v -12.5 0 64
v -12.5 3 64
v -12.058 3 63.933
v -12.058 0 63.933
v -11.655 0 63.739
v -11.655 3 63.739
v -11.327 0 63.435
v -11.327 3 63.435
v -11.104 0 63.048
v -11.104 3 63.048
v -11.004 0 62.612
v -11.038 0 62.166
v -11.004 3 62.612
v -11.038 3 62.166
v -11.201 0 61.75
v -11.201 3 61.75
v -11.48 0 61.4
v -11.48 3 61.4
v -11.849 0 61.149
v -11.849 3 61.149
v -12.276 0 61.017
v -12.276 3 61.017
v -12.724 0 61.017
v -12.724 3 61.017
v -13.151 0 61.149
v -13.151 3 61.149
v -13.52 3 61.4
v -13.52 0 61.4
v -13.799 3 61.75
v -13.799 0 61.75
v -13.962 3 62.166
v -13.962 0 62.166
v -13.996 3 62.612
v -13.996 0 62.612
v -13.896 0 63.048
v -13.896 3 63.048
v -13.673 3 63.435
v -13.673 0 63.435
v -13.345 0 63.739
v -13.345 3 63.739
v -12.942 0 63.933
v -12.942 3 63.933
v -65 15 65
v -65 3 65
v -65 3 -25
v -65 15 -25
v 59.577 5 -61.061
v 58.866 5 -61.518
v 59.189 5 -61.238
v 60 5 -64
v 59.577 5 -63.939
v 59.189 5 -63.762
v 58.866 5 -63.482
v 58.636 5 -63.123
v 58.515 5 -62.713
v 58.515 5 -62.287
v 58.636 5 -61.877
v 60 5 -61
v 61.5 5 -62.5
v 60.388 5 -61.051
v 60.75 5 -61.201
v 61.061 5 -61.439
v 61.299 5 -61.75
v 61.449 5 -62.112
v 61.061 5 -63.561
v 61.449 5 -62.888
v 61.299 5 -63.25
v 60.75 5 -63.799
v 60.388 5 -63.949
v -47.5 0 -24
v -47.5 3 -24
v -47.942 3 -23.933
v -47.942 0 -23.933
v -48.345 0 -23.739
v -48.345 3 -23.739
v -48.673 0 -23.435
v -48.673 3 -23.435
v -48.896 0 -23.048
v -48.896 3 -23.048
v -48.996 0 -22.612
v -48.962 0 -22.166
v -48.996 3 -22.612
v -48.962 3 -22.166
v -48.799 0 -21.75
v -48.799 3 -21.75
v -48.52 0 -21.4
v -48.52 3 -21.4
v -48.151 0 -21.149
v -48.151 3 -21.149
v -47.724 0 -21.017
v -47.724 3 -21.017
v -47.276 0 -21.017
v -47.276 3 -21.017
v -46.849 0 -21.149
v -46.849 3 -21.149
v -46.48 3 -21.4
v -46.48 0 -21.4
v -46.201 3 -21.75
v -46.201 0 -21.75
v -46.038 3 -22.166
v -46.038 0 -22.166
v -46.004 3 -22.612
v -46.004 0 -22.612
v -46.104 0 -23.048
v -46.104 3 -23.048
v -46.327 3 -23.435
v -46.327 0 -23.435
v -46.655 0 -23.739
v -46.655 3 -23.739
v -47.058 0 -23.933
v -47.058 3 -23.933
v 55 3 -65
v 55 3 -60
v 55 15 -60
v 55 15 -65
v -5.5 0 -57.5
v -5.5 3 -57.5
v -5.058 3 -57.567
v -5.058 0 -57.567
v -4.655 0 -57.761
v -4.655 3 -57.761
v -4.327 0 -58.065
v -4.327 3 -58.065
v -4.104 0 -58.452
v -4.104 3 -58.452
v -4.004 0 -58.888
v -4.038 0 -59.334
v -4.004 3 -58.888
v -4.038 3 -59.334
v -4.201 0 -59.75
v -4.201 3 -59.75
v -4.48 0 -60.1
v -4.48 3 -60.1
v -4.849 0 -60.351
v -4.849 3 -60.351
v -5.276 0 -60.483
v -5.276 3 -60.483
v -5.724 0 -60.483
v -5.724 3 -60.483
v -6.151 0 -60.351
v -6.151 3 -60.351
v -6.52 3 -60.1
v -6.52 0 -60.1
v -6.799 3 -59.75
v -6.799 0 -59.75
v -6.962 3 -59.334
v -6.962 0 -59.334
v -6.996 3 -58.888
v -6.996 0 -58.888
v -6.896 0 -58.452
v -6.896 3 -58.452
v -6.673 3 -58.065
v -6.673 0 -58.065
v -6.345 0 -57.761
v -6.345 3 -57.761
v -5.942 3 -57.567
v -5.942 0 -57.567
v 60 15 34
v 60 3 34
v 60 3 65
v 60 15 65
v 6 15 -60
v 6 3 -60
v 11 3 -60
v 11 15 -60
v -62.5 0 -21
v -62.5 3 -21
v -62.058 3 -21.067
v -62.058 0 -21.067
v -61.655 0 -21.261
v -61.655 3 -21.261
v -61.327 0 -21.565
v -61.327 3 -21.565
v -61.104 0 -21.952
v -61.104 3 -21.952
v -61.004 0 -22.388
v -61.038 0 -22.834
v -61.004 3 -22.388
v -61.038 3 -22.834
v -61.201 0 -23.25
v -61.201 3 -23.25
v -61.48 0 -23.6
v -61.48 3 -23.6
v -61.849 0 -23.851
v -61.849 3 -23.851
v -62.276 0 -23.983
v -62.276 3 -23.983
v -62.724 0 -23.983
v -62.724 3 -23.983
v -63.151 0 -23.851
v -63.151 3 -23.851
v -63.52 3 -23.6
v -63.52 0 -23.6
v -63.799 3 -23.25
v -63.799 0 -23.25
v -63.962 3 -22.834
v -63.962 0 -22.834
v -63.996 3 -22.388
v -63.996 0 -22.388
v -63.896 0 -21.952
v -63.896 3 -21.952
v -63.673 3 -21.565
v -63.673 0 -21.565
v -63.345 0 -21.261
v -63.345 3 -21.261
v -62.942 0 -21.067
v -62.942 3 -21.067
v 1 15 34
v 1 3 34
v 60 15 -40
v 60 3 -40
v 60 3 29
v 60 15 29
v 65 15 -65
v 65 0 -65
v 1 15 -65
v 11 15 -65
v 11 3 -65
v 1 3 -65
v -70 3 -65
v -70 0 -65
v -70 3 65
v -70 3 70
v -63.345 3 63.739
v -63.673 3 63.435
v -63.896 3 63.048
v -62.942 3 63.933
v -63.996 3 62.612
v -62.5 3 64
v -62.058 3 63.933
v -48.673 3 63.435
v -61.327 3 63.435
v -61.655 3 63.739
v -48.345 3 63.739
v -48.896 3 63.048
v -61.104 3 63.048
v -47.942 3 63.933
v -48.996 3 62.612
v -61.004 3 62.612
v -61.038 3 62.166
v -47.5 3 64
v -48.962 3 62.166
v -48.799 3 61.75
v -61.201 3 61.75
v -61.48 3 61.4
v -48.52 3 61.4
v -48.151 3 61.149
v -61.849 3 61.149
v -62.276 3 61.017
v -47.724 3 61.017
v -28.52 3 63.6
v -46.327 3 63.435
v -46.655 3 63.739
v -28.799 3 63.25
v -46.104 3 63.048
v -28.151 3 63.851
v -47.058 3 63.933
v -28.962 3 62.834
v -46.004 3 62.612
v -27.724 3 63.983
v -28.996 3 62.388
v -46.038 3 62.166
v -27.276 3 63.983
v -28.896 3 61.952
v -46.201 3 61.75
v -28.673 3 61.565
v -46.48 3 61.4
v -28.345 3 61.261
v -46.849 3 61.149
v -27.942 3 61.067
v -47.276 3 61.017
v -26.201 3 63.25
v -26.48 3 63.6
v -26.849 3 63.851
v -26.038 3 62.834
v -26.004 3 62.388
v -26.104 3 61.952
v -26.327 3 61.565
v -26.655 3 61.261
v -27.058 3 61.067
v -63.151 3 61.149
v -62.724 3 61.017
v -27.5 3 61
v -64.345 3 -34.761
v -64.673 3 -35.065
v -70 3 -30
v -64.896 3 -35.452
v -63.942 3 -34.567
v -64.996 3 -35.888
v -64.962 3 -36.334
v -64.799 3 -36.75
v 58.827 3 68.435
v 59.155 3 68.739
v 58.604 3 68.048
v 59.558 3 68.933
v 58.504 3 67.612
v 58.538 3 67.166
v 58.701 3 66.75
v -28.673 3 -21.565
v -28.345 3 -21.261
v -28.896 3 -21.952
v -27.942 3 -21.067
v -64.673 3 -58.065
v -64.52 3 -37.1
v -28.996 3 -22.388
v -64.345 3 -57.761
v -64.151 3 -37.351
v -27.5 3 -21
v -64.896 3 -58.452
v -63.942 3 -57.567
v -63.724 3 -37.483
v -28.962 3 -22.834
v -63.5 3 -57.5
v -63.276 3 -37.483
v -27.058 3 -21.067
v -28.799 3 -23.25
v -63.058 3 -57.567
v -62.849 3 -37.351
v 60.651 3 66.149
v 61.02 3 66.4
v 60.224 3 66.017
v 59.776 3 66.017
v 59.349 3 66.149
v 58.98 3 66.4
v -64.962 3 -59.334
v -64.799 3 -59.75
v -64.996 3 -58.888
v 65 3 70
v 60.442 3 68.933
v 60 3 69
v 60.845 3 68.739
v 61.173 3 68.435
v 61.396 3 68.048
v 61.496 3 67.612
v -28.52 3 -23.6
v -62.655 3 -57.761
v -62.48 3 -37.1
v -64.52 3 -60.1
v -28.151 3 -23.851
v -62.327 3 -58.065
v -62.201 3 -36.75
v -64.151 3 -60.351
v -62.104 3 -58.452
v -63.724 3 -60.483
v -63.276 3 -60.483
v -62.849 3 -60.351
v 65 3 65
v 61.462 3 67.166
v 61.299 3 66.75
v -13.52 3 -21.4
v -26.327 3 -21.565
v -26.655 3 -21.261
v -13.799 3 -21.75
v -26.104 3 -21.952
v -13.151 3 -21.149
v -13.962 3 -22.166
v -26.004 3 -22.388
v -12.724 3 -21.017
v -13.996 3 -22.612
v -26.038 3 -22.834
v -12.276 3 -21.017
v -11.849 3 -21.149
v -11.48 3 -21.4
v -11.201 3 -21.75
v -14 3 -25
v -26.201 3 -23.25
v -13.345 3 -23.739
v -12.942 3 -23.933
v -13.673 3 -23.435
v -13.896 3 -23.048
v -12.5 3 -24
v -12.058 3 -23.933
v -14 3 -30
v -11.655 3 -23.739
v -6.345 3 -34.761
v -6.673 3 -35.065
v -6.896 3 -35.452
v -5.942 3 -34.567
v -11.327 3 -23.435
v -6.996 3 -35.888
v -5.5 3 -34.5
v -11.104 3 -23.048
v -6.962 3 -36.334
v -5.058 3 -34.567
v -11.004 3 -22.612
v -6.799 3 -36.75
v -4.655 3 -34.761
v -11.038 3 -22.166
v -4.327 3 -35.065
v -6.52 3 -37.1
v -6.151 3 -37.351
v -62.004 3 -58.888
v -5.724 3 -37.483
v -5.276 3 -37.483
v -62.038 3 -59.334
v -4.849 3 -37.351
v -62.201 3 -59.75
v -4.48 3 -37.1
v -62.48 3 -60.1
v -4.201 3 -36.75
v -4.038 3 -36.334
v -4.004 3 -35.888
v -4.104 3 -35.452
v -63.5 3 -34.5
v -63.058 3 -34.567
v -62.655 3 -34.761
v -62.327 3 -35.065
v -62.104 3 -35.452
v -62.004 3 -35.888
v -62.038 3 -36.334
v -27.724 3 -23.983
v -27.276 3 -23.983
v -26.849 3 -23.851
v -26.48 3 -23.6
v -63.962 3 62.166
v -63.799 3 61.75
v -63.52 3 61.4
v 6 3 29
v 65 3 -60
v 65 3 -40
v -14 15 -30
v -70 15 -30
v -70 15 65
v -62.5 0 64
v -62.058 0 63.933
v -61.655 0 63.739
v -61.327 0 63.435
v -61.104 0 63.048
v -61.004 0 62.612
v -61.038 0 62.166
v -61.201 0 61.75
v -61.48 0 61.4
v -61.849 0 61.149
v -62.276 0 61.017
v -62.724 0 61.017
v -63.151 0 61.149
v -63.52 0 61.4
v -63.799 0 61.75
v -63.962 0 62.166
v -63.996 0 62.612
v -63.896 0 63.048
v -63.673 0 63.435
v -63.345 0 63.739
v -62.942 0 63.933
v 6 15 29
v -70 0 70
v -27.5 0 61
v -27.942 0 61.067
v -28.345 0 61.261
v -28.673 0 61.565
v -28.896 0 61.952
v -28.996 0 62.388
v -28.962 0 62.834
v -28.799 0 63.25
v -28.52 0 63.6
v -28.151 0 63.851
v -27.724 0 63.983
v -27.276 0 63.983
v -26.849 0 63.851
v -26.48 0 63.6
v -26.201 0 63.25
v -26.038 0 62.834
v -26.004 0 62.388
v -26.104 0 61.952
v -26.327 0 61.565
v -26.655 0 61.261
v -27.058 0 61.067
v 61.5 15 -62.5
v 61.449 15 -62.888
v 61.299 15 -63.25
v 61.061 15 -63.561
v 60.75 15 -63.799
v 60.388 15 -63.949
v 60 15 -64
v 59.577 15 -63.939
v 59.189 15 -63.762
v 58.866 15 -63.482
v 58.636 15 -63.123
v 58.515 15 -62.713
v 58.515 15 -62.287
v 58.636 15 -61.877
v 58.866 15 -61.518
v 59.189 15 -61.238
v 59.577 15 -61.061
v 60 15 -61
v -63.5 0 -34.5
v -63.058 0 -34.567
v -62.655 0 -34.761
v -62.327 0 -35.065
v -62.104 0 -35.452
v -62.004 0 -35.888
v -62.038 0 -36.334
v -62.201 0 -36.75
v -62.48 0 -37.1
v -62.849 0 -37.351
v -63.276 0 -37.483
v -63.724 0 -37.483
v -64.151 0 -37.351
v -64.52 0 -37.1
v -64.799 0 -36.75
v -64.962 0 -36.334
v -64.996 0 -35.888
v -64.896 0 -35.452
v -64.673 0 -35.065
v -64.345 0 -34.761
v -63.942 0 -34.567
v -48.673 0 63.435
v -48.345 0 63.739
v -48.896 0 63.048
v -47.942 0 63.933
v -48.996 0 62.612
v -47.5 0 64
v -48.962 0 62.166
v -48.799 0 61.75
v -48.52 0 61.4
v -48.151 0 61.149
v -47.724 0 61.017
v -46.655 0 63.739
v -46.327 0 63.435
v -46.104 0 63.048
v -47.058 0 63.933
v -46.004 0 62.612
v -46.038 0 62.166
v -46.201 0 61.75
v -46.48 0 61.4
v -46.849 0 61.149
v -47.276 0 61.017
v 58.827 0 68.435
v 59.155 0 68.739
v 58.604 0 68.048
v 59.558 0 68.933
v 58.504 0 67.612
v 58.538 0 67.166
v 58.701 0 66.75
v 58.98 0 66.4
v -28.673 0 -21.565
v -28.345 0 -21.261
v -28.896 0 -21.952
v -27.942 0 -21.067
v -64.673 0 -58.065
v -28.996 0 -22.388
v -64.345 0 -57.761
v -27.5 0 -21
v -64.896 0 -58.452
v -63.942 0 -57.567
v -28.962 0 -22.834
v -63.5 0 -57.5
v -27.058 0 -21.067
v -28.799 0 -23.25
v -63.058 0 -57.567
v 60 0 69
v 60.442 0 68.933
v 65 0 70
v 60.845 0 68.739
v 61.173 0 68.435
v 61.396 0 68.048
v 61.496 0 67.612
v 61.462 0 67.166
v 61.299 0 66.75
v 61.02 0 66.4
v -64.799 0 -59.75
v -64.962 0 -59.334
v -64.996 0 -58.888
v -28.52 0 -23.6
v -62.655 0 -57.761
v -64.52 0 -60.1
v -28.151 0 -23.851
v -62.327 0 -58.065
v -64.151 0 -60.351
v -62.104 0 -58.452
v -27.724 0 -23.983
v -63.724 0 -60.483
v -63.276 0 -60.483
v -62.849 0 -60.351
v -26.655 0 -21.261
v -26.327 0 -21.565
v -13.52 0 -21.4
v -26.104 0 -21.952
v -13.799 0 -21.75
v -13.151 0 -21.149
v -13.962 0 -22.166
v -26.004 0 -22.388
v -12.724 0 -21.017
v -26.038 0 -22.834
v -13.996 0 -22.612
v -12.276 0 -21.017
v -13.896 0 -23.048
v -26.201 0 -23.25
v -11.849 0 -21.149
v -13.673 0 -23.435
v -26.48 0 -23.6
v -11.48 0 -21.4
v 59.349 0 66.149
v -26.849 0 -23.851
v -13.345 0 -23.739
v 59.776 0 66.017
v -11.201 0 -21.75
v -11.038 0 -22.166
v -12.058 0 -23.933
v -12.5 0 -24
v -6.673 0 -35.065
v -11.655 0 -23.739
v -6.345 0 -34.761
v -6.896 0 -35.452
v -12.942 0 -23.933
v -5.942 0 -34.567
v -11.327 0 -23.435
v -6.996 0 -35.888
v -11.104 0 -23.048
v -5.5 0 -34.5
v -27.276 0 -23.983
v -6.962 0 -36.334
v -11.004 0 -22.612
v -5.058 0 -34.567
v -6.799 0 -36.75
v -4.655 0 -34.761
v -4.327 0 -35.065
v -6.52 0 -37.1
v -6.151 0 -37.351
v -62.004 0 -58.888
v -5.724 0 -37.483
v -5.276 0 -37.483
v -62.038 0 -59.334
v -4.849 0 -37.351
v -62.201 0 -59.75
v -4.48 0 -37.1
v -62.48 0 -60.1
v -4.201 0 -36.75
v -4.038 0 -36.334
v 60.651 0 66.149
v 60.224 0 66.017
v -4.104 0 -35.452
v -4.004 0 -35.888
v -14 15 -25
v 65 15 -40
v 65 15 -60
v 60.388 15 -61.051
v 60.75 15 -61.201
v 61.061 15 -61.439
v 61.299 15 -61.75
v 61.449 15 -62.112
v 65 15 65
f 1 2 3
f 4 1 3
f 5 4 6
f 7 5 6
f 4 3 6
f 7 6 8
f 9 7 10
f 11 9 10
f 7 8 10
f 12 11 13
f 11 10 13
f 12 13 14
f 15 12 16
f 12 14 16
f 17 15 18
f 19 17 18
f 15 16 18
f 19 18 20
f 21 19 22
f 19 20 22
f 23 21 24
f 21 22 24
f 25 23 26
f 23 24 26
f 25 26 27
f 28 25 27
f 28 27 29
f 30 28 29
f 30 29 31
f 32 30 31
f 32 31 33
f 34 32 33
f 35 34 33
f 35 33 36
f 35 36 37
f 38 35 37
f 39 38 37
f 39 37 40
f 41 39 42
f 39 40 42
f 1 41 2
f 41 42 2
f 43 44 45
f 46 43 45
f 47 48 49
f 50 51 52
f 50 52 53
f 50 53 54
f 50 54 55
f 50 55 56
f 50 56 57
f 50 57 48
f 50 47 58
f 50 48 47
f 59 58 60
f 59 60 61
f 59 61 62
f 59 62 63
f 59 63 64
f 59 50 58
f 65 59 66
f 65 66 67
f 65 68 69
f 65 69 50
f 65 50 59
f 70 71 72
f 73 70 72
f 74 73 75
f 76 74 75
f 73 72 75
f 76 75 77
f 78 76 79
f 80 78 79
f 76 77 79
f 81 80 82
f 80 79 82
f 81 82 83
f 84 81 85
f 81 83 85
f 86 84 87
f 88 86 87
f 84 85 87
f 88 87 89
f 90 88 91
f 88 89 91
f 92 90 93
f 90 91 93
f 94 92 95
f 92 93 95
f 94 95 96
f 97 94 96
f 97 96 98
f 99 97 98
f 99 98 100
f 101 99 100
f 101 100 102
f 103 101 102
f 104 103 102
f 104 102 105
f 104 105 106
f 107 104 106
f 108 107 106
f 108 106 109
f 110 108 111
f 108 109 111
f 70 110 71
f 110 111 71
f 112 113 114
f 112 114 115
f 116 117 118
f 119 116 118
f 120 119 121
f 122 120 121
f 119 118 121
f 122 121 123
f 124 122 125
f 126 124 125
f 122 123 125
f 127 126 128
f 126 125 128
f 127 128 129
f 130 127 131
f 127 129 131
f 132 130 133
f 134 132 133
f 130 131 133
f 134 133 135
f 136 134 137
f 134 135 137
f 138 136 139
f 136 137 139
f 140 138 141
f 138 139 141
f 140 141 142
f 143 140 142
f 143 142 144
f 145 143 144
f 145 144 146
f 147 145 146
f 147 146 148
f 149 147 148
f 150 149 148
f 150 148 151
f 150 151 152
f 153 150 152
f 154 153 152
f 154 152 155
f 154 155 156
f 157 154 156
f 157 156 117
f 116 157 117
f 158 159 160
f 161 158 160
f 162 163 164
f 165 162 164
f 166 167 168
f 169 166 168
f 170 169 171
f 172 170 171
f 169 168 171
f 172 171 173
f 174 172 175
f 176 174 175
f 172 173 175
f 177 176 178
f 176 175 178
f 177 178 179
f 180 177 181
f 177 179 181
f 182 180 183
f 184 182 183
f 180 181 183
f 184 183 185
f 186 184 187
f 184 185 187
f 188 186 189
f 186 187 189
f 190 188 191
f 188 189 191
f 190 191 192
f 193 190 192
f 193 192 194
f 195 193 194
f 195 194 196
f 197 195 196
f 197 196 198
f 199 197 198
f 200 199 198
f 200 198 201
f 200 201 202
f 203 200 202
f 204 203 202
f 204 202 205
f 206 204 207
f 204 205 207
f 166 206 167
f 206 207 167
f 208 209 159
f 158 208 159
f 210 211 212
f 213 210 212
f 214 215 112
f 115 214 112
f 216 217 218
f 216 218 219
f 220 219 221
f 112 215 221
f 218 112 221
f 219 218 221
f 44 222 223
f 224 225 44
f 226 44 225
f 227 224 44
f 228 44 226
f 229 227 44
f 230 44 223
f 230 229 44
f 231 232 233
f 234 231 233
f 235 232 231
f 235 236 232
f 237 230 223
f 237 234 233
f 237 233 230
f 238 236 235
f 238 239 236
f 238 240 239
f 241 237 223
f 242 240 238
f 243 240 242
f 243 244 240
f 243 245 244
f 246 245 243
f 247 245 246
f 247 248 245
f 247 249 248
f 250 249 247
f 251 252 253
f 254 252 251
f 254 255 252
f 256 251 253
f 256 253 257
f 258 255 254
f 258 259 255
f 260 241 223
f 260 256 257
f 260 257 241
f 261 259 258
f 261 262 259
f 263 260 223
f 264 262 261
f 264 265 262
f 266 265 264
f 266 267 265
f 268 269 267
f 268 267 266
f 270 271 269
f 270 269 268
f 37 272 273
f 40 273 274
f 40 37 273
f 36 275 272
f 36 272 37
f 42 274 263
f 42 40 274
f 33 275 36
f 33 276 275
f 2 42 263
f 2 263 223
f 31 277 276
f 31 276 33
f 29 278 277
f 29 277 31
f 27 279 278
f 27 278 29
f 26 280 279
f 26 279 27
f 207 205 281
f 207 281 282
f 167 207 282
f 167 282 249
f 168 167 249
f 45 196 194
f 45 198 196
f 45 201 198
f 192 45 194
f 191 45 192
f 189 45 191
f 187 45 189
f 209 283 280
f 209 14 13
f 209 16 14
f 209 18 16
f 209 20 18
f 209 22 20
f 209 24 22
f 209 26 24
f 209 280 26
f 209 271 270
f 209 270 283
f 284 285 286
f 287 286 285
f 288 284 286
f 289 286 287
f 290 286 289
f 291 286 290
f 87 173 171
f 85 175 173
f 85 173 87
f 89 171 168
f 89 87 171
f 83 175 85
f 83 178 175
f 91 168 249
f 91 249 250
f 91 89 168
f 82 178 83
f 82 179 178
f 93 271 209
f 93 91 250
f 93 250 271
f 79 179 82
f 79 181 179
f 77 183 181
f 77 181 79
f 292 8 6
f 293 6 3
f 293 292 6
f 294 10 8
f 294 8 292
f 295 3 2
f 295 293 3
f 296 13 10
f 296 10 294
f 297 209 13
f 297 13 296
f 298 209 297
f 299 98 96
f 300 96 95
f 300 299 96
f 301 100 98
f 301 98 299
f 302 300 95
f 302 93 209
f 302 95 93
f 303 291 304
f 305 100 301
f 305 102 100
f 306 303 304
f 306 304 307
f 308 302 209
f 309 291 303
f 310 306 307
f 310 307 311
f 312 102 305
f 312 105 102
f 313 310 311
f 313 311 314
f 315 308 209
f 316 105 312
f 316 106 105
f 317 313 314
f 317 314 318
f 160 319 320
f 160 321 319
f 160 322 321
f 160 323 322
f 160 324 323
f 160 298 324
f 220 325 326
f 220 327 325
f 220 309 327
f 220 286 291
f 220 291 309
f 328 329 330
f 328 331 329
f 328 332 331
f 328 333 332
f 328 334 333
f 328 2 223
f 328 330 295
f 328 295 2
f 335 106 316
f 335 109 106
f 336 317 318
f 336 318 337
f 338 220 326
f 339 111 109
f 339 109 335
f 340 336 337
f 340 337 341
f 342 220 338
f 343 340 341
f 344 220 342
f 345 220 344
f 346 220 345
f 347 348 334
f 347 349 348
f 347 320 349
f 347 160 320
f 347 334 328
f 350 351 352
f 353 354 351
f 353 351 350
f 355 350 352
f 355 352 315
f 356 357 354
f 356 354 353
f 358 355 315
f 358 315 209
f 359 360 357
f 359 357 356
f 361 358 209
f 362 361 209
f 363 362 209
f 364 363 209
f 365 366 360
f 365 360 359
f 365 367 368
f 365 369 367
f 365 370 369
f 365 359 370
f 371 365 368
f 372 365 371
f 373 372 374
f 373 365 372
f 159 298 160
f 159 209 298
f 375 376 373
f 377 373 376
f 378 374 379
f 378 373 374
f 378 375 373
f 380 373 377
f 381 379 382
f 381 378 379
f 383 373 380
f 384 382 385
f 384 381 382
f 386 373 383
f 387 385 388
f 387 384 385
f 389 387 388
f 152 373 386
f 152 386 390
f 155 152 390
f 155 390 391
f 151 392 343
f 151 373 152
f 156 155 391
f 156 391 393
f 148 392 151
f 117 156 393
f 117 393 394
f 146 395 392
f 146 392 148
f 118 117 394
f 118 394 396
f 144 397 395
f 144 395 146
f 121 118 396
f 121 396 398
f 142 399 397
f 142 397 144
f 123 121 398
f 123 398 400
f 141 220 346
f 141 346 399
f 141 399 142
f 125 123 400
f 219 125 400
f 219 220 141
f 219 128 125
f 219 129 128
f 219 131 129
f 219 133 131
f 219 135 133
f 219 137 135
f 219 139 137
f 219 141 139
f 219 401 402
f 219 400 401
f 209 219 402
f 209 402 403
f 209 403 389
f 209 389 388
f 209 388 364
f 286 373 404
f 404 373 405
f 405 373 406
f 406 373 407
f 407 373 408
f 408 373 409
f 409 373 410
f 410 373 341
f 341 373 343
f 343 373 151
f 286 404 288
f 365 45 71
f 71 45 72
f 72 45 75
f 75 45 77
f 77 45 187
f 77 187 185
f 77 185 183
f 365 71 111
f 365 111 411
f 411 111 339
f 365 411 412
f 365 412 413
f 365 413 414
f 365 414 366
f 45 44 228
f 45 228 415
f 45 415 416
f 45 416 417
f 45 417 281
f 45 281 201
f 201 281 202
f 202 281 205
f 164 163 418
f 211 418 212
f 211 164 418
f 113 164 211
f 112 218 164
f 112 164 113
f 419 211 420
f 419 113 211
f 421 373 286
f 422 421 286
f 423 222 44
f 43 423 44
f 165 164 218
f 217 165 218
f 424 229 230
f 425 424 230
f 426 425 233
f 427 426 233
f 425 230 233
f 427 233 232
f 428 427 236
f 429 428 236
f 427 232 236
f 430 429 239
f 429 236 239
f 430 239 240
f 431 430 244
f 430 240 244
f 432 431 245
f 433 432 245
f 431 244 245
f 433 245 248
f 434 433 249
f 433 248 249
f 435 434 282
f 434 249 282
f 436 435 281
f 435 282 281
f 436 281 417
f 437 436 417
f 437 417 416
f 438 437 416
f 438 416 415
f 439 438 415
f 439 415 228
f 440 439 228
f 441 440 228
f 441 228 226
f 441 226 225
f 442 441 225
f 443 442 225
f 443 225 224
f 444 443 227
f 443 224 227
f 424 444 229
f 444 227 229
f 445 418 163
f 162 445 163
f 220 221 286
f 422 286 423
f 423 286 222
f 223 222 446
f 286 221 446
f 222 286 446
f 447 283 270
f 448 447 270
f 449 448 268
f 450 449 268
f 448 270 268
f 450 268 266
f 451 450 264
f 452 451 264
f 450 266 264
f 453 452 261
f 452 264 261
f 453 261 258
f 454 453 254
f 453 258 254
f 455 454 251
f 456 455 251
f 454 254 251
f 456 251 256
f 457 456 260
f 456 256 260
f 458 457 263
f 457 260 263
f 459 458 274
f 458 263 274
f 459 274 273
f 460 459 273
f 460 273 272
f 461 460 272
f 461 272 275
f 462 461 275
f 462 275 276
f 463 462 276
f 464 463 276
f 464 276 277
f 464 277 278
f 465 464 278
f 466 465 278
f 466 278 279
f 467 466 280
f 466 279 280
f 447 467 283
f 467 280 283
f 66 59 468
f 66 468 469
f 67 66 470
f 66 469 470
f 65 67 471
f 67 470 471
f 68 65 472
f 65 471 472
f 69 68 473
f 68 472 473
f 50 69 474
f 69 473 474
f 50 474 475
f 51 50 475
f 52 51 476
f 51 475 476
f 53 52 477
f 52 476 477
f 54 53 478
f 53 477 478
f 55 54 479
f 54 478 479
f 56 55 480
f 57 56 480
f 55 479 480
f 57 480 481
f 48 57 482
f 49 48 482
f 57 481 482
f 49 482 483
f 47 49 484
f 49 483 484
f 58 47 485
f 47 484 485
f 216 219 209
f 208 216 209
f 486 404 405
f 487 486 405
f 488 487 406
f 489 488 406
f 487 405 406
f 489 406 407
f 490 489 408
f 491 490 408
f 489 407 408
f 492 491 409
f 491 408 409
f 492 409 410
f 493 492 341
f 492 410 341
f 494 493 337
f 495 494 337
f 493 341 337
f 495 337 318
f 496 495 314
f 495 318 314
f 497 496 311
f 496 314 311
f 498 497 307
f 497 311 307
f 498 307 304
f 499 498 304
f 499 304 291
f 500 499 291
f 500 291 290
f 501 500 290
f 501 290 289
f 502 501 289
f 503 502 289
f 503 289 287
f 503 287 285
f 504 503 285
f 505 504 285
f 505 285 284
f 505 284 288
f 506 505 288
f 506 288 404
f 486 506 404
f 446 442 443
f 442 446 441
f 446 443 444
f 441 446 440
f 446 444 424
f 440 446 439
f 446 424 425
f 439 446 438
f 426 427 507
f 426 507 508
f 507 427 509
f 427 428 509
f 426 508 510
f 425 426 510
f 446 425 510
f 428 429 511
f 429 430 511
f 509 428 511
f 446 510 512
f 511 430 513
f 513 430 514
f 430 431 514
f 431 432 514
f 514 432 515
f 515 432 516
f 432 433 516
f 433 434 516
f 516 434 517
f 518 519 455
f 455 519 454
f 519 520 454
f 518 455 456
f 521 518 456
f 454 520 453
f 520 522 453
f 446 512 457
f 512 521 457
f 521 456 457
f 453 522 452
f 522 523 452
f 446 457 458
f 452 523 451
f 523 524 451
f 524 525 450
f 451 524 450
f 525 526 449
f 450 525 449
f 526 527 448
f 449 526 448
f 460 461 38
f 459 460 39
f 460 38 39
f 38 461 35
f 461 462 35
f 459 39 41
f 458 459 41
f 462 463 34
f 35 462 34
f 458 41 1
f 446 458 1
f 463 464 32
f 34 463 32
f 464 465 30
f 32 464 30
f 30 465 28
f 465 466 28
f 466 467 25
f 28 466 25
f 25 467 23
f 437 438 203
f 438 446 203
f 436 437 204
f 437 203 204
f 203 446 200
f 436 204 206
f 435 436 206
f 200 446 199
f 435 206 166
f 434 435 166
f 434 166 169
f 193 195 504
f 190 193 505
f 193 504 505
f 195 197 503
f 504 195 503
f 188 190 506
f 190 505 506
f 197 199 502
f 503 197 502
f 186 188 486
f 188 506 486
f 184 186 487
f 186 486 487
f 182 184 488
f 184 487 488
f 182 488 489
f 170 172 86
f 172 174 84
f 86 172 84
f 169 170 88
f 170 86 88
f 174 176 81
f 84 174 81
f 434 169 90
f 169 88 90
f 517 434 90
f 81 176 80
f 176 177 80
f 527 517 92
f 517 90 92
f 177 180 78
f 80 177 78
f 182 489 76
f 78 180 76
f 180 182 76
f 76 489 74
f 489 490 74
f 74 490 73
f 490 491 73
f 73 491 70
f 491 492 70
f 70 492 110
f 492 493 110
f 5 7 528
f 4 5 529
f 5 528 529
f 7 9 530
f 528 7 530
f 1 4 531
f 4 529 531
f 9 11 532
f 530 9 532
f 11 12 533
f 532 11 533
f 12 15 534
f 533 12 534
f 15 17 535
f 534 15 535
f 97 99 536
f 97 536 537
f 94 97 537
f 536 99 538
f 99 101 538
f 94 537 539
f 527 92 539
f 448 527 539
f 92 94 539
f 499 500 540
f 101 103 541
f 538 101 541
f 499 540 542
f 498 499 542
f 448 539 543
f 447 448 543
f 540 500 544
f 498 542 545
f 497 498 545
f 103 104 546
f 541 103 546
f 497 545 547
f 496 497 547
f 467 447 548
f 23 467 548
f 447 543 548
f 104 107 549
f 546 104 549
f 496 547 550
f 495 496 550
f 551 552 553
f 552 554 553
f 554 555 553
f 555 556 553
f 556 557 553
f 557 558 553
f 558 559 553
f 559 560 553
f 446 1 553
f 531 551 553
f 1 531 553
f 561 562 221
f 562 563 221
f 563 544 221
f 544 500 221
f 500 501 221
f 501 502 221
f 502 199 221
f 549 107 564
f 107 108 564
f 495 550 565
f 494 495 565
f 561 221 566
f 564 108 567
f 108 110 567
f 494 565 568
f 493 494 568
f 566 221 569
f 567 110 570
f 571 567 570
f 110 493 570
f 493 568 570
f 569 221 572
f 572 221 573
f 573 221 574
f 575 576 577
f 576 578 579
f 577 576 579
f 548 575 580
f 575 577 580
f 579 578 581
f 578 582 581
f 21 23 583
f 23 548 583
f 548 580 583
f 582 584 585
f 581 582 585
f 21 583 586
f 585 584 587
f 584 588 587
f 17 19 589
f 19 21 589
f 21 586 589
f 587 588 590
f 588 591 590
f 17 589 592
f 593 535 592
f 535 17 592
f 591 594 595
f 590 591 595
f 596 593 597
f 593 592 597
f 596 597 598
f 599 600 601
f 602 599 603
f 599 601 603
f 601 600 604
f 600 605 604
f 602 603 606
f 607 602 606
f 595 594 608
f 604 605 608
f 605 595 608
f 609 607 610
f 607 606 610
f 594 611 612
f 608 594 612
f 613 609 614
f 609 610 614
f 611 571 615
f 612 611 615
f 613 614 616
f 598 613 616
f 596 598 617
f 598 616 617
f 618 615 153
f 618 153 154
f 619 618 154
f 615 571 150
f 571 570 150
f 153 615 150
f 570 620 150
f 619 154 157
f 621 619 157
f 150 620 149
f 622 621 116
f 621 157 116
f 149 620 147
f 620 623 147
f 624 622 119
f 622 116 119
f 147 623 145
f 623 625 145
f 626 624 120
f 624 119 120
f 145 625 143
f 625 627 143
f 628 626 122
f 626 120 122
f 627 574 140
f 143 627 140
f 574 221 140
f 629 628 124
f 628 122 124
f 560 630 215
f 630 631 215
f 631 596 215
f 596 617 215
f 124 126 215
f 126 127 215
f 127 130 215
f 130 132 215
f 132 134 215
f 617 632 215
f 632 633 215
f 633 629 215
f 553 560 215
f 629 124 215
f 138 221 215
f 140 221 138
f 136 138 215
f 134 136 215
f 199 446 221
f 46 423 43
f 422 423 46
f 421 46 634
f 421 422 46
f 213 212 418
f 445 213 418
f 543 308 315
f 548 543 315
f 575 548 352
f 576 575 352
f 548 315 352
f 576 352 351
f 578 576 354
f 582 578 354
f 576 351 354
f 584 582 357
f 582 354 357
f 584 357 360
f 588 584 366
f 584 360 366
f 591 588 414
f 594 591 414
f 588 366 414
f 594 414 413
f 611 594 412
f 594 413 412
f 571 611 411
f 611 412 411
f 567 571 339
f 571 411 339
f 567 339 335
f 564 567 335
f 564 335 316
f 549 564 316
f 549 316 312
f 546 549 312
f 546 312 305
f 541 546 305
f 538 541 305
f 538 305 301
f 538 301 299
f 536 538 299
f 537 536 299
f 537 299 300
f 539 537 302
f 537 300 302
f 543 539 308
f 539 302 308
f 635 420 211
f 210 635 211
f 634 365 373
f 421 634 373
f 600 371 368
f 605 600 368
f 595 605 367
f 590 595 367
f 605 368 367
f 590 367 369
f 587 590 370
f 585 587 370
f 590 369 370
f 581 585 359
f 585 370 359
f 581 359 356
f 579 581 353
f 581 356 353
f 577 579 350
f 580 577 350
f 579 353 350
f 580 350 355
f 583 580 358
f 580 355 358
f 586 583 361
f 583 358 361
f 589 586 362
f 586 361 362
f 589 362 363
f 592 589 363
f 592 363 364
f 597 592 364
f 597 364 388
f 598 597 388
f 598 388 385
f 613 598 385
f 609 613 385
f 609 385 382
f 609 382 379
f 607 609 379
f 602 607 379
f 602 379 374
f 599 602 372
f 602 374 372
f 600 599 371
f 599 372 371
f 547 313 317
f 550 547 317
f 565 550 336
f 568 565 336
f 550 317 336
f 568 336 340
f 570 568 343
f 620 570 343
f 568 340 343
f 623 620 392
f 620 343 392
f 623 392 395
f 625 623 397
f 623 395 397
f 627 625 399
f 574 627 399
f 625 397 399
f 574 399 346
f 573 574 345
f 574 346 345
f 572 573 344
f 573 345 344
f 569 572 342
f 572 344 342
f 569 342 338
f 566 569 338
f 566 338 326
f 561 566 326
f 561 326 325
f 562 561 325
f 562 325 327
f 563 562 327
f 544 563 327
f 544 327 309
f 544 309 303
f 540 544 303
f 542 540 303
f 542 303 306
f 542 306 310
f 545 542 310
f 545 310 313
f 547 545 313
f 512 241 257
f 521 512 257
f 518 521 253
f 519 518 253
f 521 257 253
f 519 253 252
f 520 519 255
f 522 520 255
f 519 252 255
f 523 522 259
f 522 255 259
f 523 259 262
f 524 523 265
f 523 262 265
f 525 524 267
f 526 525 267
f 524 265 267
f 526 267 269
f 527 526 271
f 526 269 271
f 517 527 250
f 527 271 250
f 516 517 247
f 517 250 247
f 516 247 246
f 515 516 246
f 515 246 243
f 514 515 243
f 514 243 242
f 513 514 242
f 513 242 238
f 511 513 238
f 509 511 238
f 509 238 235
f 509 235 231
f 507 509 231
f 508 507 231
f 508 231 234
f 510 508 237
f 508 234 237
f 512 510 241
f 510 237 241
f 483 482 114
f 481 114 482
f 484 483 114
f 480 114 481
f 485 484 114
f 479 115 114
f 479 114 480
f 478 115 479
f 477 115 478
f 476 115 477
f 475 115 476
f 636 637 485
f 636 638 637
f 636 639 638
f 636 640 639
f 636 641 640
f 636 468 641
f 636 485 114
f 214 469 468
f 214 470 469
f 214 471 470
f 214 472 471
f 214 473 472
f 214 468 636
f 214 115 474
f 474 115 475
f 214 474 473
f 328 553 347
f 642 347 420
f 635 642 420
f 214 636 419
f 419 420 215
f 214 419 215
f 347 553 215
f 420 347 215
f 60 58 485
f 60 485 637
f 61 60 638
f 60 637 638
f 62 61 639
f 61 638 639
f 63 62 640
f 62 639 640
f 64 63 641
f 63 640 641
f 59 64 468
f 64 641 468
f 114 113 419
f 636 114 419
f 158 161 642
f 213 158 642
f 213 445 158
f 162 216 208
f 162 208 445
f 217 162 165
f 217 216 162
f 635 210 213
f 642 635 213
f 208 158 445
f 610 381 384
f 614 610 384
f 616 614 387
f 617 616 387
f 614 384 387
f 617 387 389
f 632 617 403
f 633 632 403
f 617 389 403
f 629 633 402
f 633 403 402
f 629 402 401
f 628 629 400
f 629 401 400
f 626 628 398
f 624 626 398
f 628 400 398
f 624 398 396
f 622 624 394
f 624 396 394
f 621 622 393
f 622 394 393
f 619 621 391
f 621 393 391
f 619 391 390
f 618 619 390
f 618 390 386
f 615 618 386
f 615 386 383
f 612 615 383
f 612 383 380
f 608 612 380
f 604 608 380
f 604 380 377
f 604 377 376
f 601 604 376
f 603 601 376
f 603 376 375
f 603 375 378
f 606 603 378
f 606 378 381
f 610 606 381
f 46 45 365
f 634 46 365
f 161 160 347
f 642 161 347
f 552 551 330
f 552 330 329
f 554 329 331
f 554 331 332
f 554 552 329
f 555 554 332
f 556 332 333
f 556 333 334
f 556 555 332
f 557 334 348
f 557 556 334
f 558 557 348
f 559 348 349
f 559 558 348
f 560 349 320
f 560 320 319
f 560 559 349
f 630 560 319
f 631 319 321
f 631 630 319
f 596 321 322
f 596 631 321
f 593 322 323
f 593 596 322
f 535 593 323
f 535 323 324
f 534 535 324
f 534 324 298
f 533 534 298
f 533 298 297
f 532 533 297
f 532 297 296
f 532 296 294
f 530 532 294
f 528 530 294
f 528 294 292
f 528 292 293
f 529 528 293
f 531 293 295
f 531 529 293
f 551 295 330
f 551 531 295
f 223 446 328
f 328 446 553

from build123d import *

# Parameters (mm, degrees)
SKETCH1_W           = 130
SKETCH1_H           = 130
SKETCH1_W_2         = 5
BOSS_EXTRUDE1_DEPTH = 3
SKETCH7_R           = 1.5
CUT_EXTRUDE3_DEPTH  = 3
SKETCH8_W           = 10
SKETCH8_H           = 5
BOSS_EXTRUDE5_DEPTH = 12
SKETCH9_R           = 1.5
CUT_EXTRUDE4_DEPTH  = 9
SKETCH10_W          = 5
SKETCH10_H          = 90
BOSS_EXTRUDE6_DEPTH = 12
SKETCH12_R          = 1.5
BOSS_EXTRUDE7_DEPTH = 3
CUT_EXTRUDE5_DEPTH  = 10


with BuildPart() as part:
    # Sketch1 → Boss-Extrude1 (new body)
    with BuildSketch(Plane(origin=(0, 0, 0), x_dir=(1, 0, 0), z_dir=(0, 1, 0))):
        Rectangle(SKETCH1_W, SKETCH1_H)
        with Locations((-67.5, 0)):
            Rectangle(SKETCH1_W_2, SKETCH1_H)
    extrude(amount=BOSS_EXTRUDE1_DEPTH)

    # Sketch7 → Cut-Extrude3 (cut)
    with BuildSketch(Plane(origin=(0, 3, 0), x_dir=(1, 0, 0), z_dir=(0, 1, 0))):
        with Locations(Location((-47.5, -62.5, 0), (0, 0, 270))):
            Circle(SKETCH7_R)
        with Locations(Location((-62.5, -62.5, 0), (0, 0, 270))):
            Circle(SKETCH7_R)
        with Locations(Location((-62.5, 22.5, 0), (0, 0, 270))):
            Circle(SKETCH7_R)
        with Locations(Location((-47.5, 22.5, 0), (0, 0, 90))):
            Circle(SKETCH7_R)
        with Locations(Location((-27.5, 22.5, 0), (0, 0, 270))):
            Circle(SKETCH7_R)
        with Locations(Location((-12.5, 22.5, 0), (0, 0, 90))):
            Circle(SKETCH7_R)
        with Locations(Location((-27.5, -62.5, 0), (0, 0, 90))):
            Circle(SKETCH7_R)
        with Locations(Location((-12.5, -62.5, 0), (0, 0, 270))):
            Circle(SKETCH7_R)
    extrude(amount=-CUT_EXTRUDE3_DEPTH, mode=Mode.SUBTRACT)

    # Sketch8 → Boss-Extrude5 (add)
    with BuildSketch(Plane(origin=(0, 3, 0), x_dir=(1, 0, 0), z_dir=(0, 1, 0))):
        Polygon((60, -65), (65, -65), (65, 40), (60, 40), (60, -29), (6, -29), (6, 60), (11, 60), (11, 65), (1, 65), (1, -34), (60, -34), align=None)
        with Locations((60, 62.5)):
            Rectangle(SKETCH8_W, SKETCH8_H)
    extrude(amount=BOSS_EXTRUDE5_DEPTH)

    # Sketch9 → Cut-Extrude4 (cut)
    with BuildSketch(Plane(origin=(0, 3, 0), x_dir=(1, 0, 0), z_dir=(0, 1, 0))):
        with Locations(Location((-63.5, 59, 0), (0, 0, 270))):
            Circle(SKETCH9_R)
        with Locations(Location((-63.5, 36, 0), (0, 0, 270))):
            Circle(SKETCH9_R)
        with Locations(Location((-5.5, 36, 0), (0, 0, 270))):
            Circle(SKETCH9_R)
        with Locations(Location((-5.5, 59, 0), (0, 0, 270))):
            Circle(SKETCH9_R)
    extrude(amount=-CUT_EXTRUDE4_DEPTH, mode=Mode.SUBTRACT)

    # Sketch10 → Boss-Extrude6 (add)
    with BuildSketch(Plane(origin=(0, 3, 0), x_dir=(1, 0, 0), z_dir=(0, 1, 0))):
        Polygon((-70, 30), (-70, 25), (-65, 25), (-14, 25), (-14, 30), align=None)
        with Locations((-67.5, -20)):
            Rectangle(SKETCH10_W, SKETCH10_H)
    extrude(amount=BOSS_EXTRUDE6_DEPTH)

    # Sketch12 → Boss-Extrude7 (add)
    with BuildSketch(Plane(origin=(0, 0, 0), x_dir=(1, 0, 0), z_dir=(0, 1, 0))):
        Polygon((65, -65), (60, -65), (-65, -65), (-70, -65), (-70, -70), (65, -70), align=None)
        with Locations(Location((60, -67.5, 0), (0, 0, 270))):
            Circle(SKETCH12_R, mode=Mode.SUBTRACT)
    extrude(amount=BOSS_EXTRUDE7_DEPTH)

    # Sketch13 → Cut-Extrude5 (cut)
    with BuildSketch(Plane(origin=(0, 15, 0), x_dir=(1, 0, 0), z_dir=(0, 1, 0))):
        with BuildLine():
            ThreePointArc((61.5, 62.5), (61.060660172, 63.560660172), (60, 64))
            Line((60, 64), (60, 61))
            ThreePointArc((60, 61), (61.060660172, 61.439339828), (61.5, 62.5))
        make_face()
        with BuildLine():
            Line((60, 61), (60, 64))
            ThreePointArc((60, 64), (58.5, 62.5), (60, 61))
        make_face()
    extrude(amount=-CUT_EXTRUDE5_DEPTH, mode=Mode.SUBTRACT)


solid = part.part
